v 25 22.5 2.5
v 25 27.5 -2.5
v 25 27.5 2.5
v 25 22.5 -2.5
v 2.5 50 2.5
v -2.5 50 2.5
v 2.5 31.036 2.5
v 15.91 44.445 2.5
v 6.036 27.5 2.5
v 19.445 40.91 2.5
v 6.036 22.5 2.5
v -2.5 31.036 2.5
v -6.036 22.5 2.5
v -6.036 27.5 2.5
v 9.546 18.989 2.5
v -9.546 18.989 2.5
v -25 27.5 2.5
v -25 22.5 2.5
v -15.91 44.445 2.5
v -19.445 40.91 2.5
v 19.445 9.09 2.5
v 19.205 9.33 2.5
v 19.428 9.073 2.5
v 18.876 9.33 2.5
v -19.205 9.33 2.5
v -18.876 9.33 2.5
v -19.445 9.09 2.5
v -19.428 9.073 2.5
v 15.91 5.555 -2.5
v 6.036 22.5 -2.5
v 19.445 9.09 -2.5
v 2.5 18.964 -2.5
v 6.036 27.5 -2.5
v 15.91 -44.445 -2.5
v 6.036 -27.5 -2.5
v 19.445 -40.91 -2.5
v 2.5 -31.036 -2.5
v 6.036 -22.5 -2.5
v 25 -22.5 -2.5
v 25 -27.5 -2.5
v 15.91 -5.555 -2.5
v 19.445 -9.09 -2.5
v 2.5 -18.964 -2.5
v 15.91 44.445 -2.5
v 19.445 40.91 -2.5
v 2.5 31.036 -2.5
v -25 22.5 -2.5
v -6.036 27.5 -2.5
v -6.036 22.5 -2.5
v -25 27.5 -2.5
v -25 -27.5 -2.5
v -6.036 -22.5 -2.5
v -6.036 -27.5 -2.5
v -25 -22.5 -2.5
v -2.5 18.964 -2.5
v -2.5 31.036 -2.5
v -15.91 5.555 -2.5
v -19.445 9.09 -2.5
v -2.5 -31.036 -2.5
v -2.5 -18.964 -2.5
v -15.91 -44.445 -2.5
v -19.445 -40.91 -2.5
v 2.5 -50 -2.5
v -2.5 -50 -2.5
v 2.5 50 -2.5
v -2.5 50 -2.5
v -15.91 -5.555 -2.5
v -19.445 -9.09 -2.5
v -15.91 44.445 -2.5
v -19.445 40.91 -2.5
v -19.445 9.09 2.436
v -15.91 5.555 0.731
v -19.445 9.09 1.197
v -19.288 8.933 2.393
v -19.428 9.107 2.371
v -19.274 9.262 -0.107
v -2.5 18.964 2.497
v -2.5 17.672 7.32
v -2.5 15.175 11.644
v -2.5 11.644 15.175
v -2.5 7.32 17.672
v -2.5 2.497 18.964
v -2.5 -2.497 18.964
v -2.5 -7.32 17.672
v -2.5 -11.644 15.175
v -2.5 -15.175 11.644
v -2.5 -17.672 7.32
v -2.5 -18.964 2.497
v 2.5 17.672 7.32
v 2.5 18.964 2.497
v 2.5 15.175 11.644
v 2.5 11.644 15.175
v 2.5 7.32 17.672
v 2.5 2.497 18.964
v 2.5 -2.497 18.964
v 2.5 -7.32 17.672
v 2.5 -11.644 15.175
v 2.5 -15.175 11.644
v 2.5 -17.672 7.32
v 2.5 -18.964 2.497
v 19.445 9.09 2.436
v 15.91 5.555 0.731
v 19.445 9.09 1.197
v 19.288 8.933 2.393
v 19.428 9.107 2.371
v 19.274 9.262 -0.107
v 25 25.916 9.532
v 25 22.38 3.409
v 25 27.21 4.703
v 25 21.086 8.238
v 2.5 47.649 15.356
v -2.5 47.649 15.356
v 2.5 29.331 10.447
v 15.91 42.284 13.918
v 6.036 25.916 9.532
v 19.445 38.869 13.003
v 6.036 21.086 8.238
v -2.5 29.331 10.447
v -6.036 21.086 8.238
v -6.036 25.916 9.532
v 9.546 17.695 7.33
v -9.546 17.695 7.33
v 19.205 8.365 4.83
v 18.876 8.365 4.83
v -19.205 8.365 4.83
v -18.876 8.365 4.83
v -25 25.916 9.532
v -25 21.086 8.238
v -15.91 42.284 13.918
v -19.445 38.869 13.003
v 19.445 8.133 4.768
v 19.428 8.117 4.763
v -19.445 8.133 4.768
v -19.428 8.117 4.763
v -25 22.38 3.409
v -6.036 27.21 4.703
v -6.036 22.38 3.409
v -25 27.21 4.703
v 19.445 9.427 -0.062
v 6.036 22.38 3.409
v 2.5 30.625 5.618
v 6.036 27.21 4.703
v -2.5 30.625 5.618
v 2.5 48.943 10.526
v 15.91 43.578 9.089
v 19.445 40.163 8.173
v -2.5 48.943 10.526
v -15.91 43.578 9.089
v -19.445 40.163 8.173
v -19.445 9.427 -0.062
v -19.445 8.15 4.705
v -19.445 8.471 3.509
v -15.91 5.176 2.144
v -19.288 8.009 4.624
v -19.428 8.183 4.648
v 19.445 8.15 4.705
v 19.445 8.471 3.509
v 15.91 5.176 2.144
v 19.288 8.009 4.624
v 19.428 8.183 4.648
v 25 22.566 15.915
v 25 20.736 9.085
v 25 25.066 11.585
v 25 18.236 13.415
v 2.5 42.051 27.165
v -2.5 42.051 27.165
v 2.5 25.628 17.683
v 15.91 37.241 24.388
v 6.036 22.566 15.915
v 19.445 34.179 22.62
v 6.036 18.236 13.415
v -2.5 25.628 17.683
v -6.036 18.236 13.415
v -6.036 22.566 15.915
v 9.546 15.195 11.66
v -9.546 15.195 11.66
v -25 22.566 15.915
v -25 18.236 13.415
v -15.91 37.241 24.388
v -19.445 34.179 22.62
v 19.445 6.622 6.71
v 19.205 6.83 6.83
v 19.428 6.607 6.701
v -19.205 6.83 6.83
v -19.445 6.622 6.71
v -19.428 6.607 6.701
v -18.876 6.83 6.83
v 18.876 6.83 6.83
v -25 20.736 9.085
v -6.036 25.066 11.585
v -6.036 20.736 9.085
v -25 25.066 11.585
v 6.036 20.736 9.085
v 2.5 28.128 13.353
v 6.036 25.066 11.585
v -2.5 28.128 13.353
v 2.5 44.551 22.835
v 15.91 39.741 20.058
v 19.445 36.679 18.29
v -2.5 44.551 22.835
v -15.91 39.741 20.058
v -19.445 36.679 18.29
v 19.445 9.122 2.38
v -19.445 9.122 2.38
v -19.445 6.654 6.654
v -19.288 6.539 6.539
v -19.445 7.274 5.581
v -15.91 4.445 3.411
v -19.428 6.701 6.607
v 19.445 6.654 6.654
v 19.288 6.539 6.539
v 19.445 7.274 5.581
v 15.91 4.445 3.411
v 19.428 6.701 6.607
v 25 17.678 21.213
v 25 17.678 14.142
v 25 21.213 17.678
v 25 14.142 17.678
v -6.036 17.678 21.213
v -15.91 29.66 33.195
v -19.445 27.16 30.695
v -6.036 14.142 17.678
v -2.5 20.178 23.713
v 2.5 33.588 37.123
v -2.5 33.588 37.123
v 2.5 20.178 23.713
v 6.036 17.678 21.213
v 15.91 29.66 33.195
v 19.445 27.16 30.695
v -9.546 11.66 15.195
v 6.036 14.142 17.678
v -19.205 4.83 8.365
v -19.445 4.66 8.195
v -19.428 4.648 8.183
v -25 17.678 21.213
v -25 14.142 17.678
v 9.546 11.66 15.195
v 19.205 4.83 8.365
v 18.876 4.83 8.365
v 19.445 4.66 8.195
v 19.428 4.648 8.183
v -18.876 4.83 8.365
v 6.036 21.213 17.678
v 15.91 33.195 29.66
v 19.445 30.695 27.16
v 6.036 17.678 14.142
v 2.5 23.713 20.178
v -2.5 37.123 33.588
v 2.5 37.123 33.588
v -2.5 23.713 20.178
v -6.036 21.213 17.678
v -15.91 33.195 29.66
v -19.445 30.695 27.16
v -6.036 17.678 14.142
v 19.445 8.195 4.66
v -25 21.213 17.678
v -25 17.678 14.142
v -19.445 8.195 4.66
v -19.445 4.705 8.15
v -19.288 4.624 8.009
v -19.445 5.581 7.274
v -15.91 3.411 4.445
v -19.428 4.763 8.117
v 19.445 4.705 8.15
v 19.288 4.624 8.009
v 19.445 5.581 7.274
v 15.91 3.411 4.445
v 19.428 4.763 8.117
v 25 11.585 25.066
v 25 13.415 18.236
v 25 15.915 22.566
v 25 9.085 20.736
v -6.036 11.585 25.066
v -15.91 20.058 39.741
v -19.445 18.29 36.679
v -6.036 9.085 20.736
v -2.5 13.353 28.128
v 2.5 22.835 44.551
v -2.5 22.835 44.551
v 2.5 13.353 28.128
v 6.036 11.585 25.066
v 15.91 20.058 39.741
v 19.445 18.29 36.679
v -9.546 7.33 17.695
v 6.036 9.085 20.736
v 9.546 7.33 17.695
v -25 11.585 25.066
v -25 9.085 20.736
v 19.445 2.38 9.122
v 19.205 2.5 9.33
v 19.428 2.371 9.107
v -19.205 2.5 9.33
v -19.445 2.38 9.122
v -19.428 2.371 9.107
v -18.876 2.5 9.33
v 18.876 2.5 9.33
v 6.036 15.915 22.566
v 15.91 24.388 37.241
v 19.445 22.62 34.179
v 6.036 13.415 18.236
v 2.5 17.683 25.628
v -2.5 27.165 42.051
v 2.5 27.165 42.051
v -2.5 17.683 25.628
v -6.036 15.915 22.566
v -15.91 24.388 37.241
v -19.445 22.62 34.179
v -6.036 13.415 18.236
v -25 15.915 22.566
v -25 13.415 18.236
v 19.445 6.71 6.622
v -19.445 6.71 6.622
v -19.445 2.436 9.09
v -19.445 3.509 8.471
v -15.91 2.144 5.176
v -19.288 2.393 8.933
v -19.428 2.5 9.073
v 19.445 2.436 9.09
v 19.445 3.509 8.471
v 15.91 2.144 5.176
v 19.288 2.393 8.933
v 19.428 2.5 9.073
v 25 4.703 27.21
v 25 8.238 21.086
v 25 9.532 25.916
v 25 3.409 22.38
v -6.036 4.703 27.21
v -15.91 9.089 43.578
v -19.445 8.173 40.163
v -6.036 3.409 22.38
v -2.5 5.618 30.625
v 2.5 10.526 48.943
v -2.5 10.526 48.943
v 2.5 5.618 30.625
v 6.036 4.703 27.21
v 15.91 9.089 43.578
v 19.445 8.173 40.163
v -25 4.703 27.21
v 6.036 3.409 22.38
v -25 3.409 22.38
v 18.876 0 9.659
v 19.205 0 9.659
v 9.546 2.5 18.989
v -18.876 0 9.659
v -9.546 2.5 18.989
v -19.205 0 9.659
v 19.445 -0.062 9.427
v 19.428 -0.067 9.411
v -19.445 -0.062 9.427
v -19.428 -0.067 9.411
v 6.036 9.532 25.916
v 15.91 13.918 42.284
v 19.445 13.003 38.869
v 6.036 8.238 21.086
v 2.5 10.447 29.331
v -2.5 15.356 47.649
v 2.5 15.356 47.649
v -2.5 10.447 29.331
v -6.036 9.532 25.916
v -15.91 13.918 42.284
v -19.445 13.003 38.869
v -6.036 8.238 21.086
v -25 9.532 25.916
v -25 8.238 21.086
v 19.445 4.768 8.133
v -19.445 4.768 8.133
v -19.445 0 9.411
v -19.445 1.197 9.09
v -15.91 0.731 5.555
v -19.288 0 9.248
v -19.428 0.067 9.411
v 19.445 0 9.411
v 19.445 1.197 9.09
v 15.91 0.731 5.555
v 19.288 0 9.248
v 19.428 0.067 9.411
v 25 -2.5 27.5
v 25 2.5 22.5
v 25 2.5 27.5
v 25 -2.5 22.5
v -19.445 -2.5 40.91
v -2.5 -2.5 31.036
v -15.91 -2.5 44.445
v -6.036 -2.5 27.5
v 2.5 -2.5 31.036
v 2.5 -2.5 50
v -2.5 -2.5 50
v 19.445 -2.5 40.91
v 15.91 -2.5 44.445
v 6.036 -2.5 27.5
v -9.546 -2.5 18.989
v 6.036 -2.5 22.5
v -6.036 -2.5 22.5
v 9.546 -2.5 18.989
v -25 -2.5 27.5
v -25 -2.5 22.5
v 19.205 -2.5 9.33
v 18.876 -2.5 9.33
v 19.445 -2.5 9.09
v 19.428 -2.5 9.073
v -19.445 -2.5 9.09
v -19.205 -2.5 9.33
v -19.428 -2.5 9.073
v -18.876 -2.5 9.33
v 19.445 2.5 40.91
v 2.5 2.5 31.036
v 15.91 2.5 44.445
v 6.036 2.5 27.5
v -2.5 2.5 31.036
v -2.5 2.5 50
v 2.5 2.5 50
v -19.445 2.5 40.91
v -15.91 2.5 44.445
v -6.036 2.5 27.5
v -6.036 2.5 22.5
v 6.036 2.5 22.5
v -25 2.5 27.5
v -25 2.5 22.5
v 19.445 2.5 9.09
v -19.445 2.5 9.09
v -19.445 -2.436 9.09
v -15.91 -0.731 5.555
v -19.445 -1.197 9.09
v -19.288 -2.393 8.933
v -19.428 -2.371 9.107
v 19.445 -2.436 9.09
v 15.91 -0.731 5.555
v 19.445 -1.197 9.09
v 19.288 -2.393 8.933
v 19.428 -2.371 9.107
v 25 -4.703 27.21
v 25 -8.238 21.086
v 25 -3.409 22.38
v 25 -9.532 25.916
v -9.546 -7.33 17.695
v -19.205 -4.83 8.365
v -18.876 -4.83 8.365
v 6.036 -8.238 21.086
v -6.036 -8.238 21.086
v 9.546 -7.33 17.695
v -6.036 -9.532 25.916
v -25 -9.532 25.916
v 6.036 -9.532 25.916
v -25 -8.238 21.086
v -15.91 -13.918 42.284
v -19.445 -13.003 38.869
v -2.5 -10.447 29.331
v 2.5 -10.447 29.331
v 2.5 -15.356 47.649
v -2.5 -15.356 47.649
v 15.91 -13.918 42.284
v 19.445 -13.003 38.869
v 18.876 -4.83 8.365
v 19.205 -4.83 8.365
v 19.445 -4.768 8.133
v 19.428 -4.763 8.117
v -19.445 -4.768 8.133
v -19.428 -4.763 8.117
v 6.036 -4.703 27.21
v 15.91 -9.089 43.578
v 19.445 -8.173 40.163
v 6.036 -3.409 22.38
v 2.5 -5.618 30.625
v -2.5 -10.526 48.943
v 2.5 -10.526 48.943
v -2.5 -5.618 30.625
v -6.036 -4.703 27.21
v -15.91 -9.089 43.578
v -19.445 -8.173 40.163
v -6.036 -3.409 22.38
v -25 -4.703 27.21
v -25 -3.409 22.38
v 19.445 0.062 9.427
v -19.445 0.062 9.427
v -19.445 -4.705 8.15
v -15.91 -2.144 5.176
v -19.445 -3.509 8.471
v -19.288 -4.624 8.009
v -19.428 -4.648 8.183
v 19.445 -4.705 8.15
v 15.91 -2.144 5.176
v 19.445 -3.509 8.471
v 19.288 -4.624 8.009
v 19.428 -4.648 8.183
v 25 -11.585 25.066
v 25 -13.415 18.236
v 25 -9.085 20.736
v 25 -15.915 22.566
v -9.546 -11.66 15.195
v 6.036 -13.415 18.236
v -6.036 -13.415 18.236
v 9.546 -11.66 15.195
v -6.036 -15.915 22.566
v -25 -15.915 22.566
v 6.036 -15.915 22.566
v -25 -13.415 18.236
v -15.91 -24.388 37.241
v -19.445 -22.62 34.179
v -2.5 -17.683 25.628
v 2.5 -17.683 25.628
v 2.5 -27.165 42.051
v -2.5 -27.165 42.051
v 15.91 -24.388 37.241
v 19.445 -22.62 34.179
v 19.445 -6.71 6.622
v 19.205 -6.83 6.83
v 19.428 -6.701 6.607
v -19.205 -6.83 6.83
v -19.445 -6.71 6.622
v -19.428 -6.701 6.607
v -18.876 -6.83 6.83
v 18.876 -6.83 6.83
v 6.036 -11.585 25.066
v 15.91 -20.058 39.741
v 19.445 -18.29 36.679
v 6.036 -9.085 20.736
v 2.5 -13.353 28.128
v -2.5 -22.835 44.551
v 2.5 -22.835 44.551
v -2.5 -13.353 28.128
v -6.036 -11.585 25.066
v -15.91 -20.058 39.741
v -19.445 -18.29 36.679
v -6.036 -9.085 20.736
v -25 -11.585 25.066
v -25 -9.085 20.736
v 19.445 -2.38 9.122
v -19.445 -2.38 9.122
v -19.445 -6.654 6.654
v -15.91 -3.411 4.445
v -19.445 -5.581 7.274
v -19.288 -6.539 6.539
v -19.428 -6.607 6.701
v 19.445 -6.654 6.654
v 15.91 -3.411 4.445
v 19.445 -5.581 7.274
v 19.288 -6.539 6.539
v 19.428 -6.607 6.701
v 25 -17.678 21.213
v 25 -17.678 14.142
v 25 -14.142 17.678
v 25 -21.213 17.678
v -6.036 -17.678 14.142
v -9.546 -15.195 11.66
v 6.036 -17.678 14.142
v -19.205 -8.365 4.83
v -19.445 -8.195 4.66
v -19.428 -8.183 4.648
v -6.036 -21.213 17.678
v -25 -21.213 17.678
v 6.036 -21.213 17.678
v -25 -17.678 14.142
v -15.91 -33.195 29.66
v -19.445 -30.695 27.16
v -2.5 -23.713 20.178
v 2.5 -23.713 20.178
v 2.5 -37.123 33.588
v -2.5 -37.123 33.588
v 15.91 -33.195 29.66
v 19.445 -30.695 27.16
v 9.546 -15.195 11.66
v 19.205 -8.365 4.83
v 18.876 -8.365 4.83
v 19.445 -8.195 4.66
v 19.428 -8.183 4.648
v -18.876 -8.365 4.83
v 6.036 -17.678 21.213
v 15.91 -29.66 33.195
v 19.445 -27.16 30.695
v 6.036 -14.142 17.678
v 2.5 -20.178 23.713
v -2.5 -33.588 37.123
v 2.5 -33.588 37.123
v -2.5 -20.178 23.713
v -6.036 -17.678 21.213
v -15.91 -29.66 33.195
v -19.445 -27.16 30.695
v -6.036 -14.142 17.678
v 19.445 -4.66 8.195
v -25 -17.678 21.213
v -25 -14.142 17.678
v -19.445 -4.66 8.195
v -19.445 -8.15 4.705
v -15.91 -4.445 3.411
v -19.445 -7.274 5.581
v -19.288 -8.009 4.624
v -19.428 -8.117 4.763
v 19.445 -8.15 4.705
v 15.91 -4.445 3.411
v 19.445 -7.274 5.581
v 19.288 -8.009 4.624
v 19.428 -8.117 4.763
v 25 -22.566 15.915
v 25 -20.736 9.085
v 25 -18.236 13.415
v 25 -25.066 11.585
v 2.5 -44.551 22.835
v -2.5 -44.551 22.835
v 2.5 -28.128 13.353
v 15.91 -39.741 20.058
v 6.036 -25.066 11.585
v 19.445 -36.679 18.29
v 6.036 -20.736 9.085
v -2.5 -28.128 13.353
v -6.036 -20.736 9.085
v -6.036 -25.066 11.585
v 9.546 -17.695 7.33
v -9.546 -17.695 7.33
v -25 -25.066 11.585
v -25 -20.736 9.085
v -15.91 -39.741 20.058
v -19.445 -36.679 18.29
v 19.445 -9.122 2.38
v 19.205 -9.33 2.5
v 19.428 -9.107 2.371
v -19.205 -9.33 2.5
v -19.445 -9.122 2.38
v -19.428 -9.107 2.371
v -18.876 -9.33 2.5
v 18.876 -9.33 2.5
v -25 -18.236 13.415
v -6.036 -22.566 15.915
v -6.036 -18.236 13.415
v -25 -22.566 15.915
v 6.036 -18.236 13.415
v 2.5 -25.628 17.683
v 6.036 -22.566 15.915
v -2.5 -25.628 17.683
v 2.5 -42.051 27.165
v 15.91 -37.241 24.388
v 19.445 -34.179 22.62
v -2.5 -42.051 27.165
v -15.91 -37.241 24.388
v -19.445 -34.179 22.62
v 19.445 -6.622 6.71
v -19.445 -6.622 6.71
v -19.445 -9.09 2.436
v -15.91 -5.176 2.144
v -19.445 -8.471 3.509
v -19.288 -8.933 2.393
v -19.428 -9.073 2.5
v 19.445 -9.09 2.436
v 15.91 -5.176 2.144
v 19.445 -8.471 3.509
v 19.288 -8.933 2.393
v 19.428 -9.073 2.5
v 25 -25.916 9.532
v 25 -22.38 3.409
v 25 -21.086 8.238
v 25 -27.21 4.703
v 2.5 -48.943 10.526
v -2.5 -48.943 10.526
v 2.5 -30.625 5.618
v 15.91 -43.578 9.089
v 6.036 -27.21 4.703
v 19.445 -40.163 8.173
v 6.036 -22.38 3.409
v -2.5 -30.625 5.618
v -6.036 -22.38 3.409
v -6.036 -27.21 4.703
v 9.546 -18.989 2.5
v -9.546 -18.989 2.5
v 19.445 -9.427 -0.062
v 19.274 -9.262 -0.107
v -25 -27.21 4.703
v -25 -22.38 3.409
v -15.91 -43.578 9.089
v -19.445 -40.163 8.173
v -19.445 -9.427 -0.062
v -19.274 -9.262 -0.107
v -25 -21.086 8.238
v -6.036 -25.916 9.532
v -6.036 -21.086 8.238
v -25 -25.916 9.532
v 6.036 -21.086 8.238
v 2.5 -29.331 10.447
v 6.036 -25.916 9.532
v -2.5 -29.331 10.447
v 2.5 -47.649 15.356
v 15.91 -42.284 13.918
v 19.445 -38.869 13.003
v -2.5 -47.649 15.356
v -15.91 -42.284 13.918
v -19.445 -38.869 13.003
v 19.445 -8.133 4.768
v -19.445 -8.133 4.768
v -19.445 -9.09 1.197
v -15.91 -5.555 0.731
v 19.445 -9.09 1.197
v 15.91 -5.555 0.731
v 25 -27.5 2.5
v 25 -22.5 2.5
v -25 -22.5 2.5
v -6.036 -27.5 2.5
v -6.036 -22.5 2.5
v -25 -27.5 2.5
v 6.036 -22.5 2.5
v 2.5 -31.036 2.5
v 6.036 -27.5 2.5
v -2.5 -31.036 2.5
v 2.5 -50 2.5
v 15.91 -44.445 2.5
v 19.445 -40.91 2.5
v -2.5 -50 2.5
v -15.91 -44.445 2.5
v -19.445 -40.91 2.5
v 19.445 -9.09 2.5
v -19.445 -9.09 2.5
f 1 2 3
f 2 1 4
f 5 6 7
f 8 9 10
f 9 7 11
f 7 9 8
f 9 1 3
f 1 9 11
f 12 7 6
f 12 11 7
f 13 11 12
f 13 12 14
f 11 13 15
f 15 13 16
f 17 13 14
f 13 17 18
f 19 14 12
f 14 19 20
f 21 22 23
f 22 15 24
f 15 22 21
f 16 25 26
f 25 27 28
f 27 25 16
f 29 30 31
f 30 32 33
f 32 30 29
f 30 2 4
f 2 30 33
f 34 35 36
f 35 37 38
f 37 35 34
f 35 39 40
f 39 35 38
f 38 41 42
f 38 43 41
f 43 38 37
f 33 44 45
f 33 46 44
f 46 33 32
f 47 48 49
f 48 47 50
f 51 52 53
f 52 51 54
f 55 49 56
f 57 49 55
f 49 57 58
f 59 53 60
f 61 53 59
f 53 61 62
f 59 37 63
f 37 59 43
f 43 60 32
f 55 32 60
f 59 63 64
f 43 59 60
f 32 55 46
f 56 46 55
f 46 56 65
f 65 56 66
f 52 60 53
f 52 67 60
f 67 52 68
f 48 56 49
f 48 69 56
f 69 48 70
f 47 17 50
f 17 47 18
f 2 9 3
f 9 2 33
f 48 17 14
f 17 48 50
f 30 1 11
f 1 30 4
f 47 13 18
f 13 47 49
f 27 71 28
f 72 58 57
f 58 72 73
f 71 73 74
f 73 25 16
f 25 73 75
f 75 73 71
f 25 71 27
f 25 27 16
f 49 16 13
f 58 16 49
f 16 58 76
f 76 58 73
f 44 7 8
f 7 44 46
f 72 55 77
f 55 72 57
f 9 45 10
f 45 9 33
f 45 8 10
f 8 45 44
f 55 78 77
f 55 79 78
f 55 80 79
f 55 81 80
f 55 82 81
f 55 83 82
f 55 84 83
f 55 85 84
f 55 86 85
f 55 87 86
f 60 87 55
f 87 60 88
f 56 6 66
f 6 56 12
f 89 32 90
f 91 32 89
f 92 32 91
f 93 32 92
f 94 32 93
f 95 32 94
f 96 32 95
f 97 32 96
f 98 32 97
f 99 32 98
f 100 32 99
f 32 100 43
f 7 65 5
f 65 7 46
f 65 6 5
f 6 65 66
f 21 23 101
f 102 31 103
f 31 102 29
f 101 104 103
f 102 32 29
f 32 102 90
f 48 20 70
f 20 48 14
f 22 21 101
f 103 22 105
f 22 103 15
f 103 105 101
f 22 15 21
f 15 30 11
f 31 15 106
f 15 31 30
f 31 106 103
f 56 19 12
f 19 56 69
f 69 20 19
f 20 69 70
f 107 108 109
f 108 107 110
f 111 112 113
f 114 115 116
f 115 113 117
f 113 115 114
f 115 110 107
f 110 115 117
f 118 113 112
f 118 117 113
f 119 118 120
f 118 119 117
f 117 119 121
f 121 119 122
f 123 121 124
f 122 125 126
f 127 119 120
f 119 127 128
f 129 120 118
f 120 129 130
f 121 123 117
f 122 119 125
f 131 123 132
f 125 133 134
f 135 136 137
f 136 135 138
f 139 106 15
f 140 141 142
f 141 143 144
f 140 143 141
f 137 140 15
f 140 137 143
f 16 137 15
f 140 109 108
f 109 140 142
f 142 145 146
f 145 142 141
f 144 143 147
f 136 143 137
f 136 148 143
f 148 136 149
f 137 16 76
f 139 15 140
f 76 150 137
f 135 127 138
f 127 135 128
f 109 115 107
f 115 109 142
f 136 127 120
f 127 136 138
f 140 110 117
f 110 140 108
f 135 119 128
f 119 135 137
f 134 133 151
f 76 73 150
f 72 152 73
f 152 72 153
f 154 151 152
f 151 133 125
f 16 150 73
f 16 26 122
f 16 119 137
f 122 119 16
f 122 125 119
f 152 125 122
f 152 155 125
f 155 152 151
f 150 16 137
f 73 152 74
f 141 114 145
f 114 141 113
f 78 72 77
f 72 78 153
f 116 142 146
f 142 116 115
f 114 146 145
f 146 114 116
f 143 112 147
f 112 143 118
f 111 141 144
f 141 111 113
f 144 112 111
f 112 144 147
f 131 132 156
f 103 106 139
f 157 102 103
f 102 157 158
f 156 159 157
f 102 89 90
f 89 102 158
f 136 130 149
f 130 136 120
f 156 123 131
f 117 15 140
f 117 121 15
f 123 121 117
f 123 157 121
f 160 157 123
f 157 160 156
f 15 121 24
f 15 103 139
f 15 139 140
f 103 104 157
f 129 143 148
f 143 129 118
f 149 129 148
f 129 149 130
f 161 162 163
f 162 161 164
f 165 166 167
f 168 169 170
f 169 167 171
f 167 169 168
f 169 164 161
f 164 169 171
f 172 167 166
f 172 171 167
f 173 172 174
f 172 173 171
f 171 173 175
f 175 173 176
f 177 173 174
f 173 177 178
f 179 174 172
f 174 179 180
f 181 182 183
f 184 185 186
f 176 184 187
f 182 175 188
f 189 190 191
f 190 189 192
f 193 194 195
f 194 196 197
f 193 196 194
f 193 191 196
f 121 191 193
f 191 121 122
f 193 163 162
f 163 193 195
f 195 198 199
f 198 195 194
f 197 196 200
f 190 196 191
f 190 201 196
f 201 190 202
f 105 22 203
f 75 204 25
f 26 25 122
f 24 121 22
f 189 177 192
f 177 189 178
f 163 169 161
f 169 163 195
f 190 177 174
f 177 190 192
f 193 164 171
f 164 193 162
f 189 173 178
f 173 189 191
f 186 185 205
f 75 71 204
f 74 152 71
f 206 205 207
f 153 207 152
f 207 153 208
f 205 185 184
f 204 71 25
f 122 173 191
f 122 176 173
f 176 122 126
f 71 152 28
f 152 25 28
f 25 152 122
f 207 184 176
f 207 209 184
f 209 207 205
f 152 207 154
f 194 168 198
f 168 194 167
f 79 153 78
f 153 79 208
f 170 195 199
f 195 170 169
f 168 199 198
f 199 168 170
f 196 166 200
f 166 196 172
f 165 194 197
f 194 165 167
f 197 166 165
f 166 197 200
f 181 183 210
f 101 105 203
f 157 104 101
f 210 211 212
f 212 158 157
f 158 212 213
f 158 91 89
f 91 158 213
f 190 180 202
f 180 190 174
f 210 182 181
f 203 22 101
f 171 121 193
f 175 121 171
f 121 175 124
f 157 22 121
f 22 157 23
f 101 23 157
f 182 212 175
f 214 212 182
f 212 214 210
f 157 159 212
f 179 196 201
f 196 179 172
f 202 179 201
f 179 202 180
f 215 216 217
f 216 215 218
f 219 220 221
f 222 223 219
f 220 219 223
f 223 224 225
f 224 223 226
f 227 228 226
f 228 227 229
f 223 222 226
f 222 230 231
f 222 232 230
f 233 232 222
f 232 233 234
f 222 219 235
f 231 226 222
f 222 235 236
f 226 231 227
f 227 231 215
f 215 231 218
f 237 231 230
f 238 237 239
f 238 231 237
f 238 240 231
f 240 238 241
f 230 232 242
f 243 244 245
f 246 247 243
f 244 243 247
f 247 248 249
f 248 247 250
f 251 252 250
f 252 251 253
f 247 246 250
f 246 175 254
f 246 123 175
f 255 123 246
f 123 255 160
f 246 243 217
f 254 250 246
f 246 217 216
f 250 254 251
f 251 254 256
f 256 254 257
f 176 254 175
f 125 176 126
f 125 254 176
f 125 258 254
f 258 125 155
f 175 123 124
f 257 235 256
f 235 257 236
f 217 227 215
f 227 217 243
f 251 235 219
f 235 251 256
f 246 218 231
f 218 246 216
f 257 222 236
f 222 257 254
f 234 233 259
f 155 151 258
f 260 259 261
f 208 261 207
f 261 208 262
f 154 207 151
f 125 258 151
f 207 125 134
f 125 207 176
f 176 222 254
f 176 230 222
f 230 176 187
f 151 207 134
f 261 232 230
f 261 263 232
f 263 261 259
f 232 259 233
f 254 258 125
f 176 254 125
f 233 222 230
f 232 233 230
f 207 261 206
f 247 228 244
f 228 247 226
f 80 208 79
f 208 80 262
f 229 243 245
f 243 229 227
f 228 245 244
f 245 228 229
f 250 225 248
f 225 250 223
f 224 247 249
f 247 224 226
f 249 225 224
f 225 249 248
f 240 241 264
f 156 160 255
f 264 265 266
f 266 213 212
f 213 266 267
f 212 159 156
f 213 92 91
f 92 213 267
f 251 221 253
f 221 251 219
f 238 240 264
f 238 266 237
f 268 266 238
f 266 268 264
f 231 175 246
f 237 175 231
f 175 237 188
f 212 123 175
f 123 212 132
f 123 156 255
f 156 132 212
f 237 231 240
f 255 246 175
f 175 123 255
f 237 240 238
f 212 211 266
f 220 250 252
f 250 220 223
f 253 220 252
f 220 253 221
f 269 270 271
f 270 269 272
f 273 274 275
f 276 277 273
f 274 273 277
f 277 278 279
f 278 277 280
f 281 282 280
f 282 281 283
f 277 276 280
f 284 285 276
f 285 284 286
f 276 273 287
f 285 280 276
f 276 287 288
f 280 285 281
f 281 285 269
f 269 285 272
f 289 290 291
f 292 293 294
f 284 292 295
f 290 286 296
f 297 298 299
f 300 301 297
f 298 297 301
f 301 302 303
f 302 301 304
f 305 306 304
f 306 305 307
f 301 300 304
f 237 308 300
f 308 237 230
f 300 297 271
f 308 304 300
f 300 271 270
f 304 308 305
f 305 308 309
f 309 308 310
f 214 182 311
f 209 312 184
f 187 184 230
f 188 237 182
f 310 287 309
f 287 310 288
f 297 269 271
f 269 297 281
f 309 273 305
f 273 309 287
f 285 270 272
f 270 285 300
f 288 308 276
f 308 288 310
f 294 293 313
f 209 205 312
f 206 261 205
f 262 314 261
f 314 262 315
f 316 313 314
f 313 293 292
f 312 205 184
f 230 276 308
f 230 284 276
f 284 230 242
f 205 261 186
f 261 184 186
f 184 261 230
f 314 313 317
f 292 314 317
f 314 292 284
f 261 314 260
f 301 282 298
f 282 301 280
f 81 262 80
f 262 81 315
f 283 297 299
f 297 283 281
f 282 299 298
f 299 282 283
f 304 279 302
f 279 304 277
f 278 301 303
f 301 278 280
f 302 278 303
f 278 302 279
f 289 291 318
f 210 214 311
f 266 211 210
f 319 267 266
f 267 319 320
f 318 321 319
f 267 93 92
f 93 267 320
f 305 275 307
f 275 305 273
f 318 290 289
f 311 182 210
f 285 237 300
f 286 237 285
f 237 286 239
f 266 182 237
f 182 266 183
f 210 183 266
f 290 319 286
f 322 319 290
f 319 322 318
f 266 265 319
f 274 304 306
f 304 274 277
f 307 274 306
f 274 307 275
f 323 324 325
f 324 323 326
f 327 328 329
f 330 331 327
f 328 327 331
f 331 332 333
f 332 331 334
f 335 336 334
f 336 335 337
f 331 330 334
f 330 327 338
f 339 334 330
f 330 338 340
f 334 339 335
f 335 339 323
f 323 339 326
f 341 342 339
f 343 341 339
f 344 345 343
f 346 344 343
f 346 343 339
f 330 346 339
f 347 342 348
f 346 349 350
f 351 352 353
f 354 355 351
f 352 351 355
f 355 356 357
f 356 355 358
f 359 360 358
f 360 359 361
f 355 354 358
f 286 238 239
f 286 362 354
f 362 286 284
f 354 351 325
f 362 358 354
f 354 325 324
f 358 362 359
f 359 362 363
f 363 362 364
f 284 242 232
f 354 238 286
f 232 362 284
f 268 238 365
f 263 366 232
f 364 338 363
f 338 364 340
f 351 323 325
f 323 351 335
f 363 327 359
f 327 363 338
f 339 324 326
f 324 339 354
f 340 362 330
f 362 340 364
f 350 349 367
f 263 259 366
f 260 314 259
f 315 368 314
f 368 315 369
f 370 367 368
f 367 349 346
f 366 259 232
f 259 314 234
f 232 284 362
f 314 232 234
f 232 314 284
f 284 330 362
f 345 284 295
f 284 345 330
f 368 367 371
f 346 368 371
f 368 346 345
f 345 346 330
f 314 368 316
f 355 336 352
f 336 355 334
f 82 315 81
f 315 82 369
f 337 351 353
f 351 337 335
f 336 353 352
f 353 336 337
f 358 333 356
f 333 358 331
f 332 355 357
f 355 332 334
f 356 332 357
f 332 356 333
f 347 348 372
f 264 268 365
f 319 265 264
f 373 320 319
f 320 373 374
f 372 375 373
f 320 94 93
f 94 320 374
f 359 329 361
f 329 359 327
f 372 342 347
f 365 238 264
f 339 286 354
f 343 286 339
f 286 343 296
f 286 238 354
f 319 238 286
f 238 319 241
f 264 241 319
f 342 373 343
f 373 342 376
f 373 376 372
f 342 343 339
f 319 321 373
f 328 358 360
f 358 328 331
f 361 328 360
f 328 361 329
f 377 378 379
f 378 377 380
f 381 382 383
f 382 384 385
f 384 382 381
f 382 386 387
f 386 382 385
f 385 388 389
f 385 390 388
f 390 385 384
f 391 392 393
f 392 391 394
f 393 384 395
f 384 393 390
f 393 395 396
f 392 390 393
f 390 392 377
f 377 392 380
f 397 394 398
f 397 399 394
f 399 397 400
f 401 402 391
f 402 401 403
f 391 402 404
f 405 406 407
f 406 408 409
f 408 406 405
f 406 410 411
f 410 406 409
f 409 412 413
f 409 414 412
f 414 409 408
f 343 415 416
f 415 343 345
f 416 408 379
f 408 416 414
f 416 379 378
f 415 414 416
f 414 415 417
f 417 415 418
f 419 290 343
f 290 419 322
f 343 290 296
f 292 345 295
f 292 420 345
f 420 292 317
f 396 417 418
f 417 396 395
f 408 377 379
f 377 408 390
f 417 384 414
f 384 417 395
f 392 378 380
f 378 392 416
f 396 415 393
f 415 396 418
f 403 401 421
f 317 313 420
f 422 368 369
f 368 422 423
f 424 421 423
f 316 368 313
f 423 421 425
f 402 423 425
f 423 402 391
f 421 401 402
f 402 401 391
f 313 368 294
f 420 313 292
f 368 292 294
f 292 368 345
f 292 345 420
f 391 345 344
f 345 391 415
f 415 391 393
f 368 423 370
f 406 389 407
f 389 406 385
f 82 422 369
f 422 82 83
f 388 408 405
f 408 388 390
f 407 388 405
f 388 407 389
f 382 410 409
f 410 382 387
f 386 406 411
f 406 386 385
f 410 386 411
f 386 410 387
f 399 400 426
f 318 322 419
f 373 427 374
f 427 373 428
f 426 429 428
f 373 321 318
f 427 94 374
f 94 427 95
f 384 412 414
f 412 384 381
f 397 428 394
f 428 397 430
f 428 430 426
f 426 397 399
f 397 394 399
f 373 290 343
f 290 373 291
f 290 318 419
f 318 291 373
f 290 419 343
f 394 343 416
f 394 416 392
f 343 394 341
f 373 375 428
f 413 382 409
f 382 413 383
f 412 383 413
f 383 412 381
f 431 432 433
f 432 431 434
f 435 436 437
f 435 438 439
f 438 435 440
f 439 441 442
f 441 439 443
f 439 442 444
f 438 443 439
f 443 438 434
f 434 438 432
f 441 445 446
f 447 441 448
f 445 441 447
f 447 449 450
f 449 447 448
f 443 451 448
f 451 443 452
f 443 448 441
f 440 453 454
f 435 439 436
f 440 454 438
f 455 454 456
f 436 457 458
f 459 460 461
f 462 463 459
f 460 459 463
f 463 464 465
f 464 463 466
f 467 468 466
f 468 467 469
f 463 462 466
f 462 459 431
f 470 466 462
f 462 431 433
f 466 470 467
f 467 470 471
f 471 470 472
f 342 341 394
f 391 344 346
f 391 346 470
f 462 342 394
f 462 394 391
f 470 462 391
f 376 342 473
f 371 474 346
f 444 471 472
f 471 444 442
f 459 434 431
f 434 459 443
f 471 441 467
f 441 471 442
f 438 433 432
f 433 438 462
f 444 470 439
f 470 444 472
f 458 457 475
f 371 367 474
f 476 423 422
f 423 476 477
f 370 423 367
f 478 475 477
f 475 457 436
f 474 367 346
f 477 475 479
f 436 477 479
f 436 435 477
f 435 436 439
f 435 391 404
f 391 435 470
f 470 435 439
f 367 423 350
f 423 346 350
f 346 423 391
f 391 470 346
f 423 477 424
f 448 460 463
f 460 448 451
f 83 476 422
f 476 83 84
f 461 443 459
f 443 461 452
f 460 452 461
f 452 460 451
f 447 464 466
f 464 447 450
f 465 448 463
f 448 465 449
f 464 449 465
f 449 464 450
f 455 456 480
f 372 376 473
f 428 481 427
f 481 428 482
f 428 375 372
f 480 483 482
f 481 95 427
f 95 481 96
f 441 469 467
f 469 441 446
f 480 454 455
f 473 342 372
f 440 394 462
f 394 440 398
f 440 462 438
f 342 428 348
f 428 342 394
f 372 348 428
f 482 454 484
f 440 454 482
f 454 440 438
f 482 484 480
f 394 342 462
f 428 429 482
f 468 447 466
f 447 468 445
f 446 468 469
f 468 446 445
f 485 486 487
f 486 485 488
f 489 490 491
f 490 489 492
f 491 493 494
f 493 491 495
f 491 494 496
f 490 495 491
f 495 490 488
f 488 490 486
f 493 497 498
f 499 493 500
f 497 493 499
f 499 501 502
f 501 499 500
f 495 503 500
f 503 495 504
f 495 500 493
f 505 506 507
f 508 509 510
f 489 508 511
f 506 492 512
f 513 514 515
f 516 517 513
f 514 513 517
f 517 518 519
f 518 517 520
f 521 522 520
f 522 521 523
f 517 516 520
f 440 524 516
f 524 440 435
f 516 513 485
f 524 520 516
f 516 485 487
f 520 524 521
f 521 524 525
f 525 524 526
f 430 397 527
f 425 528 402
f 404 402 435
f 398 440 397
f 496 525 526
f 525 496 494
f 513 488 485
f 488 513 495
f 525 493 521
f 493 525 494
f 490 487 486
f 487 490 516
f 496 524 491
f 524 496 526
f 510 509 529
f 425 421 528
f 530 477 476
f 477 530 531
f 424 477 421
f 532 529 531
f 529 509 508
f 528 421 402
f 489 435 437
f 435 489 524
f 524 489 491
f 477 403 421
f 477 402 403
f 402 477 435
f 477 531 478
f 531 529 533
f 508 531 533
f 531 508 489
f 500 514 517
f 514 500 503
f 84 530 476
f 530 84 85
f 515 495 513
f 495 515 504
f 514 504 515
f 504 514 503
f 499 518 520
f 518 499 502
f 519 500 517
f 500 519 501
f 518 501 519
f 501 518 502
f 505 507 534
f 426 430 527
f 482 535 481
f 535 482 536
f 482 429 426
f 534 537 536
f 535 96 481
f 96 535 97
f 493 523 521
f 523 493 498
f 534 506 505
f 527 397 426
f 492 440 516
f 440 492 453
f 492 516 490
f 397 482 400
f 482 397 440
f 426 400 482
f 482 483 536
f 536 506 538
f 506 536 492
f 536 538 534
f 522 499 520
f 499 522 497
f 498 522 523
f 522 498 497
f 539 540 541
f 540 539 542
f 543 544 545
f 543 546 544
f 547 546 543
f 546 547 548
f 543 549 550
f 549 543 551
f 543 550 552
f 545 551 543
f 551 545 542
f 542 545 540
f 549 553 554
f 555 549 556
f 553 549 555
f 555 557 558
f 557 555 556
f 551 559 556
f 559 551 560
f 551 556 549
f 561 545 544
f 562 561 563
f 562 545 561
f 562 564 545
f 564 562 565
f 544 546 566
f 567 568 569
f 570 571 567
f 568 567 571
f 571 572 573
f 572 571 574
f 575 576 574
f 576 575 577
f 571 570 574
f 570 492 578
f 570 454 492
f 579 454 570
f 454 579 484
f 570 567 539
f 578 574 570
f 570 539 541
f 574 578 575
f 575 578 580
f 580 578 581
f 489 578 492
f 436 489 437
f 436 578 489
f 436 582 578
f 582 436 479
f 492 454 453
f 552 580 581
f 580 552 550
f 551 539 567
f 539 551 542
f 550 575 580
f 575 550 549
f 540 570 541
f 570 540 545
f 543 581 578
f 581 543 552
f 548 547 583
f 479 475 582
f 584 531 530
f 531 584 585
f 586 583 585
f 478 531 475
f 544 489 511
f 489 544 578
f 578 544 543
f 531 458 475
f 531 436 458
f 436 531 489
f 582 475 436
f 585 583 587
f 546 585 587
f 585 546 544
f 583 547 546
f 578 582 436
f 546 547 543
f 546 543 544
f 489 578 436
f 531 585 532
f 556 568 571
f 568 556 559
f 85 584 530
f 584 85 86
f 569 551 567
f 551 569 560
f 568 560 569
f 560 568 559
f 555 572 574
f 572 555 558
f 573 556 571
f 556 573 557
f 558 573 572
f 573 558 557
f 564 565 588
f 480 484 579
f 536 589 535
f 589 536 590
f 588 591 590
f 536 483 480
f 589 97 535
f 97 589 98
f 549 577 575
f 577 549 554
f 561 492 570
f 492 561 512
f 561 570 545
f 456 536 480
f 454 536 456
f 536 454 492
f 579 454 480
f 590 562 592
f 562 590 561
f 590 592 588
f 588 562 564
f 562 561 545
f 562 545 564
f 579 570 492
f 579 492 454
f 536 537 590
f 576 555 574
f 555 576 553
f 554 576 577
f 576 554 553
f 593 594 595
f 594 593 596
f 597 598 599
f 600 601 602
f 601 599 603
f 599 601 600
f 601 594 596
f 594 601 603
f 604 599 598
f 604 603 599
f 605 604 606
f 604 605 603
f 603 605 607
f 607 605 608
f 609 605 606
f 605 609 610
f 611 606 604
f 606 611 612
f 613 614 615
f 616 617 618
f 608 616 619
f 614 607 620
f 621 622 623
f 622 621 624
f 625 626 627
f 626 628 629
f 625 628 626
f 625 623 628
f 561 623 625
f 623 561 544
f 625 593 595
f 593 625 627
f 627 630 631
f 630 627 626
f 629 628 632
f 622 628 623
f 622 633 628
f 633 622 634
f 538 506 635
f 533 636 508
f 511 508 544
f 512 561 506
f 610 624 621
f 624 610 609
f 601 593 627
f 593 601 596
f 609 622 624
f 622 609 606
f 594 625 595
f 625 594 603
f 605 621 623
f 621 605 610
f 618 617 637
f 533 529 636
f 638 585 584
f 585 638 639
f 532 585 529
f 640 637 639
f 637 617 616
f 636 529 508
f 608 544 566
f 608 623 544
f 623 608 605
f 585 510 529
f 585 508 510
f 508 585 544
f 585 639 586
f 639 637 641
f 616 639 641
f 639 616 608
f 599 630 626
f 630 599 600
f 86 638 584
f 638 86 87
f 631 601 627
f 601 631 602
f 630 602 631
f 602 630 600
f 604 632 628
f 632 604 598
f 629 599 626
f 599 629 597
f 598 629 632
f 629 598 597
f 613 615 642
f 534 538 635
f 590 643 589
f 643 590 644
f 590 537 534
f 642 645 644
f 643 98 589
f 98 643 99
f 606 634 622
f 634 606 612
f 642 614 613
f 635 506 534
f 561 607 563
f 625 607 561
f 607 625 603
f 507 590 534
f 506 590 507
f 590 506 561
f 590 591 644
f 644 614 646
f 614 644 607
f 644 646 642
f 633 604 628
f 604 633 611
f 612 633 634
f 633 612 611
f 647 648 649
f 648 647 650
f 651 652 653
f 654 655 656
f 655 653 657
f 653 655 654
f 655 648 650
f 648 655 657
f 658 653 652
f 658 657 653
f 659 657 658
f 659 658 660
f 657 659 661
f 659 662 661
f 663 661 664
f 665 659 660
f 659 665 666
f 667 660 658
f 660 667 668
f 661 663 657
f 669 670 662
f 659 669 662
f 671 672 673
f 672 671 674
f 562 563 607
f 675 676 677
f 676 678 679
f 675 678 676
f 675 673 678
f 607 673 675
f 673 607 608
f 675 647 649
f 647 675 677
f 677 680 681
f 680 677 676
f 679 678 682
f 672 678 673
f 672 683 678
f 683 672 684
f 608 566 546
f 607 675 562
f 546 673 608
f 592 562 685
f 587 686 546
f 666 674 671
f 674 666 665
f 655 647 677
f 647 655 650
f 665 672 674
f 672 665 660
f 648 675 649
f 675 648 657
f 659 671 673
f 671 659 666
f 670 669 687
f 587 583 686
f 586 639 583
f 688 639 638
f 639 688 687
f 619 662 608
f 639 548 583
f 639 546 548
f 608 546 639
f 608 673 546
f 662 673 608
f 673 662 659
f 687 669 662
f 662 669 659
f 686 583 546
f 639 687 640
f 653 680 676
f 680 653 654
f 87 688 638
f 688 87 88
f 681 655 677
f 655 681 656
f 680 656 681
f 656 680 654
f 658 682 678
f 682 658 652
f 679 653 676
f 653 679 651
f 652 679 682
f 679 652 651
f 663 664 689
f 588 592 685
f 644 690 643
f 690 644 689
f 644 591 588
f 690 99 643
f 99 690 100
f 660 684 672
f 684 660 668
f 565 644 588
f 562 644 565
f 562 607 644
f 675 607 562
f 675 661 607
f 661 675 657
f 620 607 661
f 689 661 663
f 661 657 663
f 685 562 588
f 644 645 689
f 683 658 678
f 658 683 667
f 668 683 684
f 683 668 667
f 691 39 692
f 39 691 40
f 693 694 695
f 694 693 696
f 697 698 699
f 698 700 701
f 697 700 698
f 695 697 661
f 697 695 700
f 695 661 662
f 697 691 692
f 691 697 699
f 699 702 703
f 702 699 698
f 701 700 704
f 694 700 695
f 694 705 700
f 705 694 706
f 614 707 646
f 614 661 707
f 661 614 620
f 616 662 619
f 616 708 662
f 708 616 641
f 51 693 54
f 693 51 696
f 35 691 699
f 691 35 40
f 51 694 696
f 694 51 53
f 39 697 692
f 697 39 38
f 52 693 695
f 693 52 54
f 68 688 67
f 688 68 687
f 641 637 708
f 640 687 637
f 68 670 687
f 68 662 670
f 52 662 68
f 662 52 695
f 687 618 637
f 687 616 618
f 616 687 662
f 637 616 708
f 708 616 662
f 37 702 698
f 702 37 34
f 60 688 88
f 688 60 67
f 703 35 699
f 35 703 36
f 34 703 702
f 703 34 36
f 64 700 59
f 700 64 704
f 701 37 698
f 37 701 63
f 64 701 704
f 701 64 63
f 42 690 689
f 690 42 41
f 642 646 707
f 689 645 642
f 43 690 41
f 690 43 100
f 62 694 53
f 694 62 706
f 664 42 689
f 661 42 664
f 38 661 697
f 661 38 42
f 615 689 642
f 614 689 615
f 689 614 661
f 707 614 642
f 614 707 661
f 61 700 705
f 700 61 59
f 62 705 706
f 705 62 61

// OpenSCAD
coreArmLength = 50; //[10:50]
coreArmDepth = 5; //[1:10]
coreArmHeight = 5; //[1:10]
armsPerUnit = 4; //[1:15]
unitCount = 12; //[1:25]

module base(rotate=0) {

    rotate([0,0,rotate]){
    cube(size=[coreArmLength,coreArmDepth,coreArmHeight], center=true);
    }
}

module createSpike(step = 10) {
    for (a = [0 : step]) 
    base((180 / step) * a);
}

union() {
for (b = [0 : unitCount]) 
    rotate([(180/unitCount)*b,0,0]){
        translate([0,(coreArmLength/2),0])
        createSpike(armsPerUnit);
    }
};
